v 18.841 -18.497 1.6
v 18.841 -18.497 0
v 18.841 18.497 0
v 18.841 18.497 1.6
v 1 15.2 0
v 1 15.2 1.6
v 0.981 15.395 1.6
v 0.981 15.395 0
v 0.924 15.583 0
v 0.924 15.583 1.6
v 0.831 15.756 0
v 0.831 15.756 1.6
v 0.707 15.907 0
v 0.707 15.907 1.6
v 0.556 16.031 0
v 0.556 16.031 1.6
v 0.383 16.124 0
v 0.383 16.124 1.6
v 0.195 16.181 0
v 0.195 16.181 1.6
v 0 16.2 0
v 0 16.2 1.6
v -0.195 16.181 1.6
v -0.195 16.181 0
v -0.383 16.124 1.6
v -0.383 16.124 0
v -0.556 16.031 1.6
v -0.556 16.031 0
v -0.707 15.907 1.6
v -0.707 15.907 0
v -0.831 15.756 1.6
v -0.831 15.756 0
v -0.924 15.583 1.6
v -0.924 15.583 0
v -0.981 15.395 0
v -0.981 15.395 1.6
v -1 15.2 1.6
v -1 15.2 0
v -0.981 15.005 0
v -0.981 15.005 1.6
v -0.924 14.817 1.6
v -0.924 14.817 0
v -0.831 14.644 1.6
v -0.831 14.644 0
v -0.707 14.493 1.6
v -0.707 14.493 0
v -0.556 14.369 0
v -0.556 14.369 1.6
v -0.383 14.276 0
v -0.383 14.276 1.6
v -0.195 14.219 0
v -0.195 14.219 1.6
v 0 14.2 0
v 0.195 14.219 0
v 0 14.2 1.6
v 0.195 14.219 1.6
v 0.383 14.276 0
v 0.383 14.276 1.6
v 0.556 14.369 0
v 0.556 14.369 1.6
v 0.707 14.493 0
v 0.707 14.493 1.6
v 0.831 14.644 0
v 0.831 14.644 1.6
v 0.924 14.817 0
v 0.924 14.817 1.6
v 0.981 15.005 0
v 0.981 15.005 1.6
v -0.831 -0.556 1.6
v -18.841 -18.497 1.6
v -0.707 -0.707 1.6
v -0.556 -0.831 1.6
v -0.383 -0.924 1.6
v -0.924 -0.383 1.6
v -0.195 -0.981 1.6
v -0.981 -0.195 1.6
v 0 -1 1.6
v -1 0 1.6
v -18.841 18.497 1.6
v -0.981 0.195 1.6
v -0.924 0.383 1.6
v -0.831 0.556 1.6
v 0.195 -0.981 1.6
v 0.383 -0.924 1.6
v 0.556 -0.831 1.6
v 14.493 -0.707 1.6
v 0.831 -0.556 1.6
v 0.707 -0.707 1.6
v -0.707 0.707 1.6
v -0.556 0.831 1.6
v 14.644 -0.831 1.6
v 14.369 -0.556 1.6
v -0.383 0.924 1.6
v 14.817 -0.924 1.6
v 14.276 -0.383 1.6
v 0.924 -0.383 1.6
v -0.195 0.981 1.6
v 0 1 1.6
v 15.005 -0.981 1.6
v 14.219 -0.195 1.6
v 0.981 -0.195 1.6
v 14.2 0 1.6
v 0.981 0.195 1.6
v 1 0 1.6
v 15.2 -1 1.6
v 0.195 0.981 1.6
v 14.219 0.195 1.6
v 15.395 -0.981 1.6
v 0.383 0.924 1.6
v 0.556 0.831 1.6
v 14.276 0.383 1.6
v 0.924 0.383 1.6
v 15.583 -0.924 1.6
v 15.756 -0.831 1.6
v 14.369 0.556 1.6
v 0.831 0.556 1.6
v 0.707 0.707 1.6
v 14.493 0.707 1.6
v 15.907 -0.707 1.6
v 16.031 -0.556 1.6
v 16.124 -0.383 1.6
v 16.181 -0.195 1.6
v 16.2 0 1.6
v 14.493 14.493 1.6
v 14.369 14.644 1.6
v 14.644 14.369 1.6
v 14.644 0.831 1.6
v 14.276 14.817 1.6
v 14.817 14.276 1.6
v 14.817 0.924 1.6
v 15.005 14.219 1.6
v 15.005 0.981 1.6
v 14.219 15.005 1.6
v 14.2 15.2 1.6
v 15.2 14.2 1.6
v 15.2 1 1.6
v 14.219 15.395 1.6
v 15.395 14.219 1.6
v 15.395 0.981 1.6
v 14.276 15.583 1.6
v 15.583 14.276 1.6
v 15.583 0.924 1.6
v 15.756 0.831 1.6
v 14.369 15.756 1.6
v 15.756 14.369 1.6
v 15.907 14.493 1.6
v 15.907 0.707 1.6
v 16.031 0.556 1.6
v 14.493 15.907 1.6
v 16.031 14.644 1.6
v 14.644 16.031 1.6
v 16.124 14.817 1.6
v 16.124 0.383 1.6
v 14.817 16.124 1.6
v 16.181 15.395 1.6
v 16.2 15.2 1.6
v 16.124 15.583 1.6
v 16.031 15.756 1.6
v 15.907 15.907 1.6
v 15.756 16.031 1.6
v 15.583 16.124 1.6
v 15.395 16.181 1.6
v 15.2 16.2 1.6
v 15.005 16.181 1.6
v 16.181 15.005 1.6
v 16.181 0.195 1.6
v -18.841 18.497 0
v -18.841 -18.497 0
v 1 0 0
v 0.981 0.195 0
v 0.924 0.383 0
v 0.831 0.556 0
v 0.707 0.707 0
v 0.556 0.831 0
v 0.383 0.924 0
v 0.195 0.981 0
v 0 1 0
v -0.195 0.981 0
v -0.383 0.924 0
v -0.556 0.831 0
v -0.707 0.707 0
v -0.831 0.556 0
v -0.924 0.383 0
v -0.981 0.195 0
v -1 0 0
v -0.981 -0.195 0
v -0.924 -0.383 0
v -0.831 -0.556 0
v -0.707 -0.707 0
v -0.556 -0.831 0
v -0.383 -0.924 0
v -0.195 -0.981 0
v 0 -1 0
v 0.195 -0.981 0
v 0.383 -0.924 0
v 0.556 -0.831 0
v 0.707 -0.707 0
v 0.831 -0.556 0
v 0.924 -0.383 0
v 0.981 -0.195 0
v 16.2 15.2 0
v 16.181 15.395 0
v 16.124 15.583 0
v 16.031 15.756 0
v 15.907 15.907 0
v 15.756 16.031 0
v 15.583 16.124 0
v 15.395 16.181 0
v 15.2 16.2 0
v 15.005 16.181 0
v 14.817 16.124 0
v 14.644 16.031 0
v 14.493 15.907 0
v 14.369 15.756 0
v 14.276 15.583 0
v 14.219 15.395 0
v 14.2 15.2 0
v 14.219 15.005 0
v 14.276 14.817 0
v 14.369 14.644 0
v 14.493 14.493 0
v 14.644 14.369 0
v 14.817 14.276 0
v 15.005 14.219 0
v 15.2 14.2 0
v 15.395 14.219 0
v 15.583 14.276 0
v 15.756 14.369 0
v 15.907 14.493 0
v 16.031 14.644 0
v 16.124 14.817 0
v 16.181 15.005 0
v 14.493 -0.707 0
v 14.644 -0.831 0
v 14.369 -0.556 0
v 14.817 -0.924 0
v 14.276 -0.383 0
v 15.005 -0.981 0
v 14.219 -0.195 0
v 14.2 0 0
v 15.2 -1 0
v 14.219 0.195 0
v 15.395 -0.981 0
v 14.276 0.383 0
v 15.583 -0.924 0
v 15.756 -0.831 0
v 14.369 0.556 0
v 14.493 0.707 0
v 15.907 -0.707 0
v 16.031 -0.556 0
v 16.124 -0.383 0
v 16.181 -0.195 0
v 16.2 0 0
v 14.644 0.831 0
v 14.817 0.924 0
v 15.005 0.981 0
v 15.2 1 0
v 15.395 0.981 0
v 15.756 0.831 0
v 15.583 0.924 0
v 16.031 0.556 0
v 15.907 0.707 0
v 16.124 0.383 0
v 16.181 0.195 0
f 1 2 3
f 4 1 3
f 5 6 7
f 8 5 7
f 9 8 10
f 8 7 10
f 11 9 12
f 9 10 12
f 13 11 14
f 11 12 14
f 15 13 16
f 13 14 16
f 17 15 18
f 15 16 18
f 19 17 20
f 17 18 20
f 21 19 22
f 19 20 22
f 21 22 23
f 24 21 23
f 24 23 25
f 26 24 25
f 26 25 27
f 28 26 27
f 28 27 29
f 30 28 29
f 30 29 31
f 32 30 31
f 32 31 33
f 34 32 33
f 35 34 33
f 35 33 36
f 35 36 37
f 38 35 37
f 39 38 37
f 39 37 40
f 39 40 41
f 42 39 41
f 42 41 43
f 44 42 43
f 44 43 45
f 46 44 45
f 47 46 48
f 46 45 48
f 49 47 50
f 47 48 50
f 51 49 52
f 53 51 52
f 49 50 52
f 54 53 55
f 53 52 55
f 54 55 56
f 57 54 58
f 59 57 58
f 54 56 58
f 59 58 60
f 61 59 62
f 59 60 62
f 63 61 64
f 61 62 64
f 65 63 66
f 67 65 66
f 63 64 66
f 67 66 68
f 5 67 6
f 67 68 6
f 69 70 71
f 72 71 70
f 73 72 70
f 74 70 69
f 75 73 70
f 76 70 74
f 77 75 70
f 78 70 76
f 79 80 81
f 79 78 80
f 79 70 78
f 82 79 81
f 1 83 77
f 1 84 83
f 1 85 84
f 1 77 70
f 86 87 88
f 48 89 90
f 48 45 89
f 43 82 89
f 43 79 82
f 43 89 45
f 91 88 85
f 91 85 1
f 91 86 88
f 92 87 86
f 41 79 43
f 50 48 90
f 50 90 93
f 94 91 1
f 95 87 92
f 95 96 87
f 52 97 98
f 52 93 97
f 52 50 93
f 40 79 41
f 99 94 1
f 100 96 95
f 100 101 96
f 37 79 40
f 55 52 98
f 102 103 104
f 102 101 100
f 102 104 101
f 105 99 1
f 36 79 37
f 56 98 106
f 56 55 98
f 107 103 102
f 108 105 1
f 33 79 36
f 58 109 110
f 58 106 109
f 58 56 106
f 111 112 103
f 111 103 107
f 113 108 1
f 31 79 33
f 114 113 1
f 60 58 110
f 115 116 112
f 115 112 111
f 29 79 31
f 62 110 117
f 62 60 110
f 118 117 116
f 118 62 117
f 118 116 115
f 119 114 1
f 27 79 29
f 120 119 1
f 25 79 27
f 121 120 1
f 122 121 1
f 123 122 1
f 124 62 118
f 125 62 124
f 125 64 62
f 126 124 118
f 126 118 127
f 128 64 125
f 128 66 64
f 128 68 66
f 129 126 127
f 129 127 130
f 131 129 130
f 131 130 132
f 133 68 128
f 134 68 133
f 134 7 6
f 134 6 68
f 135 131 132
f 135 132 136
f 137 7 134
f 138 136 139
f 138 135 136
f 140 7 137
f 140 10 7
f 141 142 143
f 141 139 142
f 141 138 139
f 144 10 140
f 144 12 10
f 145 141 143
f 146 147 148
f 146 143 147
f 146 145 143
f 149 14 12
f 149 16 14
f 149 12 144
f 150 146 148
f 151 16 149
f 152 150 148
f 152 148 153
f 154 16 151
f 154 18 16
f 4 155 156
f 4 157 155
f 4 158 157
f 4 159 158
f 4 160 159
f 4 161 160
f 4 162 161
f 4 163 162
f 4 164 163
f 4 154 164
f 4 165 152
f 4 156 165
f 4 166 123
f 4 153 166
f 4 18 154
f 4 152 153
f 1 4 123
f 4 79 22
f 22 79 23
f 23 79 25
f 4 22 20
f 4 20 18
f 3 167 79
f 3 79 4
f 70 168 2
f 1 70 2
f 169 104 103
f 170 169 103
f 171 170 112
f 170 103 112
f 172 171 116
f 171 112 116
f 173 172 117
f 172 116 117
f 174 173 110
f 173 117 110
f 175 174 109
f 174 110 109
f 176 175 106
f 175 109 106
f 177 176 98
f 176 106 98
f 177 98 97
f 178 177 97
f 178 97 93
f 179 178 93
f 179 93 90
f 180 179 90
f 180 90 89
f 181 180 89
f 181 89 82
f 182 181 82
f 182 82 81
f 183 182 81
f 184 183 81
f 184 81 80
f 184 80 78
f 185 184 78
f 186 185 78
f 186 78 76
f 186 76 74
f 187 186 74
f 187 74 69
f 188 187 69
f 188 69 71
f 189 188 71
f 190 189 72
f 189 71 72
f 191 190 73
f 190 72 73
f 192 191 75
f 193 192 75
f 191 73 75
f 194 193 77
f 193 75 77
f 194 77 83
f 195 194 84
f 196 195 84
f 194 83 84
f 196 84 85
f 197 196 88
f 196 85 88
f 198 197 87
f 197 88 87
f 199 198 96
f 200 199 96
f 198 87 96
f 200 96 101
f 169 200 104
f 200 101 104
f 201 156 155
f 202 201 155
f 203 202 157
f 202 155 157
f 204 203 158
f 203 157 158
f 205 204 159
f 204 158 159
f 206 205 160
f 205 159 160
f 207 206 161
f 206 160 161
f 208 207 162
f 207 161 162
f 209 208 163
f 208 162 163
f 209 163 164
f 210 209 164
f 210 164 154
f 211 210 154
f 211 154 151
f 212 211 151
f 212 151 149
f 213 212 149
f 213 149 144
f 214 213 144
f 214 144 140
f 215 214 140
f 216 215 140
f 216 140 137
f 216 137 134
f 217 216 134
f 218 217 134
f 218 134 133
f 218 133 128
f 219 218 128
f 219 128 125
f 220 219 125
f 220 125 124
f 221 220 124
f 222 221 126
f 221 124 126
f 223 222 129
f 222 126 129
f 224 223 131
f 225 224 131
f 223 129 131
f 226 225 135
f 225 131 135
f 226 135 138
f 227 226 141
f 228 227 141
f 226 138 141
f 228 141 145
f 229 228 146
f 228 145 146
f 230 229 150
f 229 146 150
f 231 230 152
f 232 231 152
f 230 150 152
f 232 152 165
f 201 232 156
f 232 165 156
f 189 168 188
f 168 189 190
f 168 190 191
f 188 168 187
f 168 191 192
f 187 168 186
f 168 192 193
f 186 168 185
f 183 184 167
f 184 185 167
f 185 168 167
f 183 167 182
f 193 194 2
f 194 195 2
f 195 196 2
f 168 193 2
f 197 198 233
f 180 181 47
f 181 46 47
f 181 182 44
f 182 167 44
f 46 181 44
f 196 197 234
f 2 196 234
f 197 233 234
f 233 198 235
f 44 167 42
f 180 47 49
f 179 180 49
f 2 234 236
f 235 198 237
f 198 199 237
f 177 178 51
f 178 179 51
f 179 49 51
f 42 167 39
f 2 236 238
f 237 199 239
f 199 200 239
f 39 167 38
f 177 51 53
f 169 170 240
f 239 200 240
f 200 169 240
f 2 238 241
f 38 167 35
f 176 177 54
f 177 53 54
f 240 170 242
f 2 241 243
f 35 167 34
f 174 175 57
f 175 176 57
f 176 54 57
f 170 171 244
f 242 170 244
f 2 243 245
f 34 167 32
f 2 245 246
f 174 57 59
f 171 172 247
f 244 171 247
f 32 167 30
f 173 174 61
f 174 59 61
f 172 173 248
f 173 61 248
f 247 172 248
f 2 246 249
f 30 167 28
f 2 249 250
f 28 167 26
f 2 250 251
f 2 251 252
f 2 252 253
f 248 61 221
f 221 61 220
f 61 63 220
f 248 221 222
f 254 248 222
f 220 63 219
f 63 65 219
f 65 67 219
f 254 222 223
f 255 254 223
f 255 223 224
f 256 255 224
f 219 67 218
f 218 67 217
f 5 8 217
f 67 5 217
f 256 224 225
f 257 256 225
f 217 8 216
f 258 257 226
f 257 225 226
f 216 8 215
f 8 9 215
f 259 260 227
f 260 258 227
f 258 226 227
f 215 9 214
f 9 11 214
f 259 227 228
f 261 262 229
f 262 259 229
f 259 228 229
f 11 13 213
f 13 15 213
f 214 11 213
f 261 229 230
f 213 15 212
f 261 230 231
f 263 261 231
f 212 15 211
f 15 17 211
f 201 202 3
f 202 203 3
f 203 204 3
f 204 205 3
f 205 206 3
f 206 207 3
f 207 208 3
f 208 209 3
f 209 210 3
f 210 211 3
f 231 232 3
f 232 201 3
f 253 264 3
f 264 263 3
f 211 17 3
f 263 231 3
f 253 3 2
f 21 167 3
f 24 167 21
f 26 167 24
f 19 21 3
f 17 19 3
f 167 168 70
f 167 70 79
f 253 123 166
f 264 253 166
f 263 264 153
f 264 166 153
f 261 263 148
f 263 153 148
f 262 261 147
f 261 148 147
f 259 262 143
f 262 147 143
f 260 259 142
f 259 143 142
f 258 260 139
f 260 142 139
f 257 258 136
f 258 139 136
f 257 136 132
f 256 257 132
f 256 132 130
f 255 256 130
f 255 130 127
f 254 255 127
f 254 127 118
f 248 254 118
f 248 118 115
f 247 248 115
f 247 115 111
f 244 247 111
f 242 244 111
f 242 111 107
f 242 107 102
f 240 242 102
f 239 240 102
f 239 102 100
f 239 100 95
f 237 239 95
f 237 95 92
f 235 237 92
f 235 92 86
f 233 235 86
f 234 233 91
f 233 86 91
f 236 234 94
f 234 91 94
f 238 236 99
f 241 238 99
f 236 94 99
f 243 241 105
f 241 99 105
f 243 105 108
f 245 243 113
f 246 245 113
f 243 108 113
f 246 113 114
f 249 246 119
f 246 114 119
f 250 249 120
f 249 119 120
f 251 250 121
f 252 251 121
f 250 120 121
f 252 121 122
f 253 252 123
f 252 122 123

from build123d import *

# Parameters (mm, degrees)
F0_W     = 37.681248
F0_H     = 36.994756
F1_DEPTH = 1.6
F2_R     = 1
F3_DEPTH = 25


with BuildPart() as f1:
    # F0 (on Top) → F1 (new body)
    with BuildSketch(Plane.XY):
        Rectangle(F0_W, F0_H)
    extrude(amount=F1_DEPTH)

    # F2 (on face) → F3 (cut)
    with BuildSketch(Plane.XY.offset(1.6)):
        Circle(F2_R)
        with Locations((0, 15.2)):
            Circle(F2_R)
        with Locations((15.2, 0)):
            Circle(F2_R)
        with Locations((15.2, 15.2)):
            Circle(F2_R)
    extrude(amount=-F3_DEPTH, mode=Mode.SUBTRACT)


solid = f1.part
